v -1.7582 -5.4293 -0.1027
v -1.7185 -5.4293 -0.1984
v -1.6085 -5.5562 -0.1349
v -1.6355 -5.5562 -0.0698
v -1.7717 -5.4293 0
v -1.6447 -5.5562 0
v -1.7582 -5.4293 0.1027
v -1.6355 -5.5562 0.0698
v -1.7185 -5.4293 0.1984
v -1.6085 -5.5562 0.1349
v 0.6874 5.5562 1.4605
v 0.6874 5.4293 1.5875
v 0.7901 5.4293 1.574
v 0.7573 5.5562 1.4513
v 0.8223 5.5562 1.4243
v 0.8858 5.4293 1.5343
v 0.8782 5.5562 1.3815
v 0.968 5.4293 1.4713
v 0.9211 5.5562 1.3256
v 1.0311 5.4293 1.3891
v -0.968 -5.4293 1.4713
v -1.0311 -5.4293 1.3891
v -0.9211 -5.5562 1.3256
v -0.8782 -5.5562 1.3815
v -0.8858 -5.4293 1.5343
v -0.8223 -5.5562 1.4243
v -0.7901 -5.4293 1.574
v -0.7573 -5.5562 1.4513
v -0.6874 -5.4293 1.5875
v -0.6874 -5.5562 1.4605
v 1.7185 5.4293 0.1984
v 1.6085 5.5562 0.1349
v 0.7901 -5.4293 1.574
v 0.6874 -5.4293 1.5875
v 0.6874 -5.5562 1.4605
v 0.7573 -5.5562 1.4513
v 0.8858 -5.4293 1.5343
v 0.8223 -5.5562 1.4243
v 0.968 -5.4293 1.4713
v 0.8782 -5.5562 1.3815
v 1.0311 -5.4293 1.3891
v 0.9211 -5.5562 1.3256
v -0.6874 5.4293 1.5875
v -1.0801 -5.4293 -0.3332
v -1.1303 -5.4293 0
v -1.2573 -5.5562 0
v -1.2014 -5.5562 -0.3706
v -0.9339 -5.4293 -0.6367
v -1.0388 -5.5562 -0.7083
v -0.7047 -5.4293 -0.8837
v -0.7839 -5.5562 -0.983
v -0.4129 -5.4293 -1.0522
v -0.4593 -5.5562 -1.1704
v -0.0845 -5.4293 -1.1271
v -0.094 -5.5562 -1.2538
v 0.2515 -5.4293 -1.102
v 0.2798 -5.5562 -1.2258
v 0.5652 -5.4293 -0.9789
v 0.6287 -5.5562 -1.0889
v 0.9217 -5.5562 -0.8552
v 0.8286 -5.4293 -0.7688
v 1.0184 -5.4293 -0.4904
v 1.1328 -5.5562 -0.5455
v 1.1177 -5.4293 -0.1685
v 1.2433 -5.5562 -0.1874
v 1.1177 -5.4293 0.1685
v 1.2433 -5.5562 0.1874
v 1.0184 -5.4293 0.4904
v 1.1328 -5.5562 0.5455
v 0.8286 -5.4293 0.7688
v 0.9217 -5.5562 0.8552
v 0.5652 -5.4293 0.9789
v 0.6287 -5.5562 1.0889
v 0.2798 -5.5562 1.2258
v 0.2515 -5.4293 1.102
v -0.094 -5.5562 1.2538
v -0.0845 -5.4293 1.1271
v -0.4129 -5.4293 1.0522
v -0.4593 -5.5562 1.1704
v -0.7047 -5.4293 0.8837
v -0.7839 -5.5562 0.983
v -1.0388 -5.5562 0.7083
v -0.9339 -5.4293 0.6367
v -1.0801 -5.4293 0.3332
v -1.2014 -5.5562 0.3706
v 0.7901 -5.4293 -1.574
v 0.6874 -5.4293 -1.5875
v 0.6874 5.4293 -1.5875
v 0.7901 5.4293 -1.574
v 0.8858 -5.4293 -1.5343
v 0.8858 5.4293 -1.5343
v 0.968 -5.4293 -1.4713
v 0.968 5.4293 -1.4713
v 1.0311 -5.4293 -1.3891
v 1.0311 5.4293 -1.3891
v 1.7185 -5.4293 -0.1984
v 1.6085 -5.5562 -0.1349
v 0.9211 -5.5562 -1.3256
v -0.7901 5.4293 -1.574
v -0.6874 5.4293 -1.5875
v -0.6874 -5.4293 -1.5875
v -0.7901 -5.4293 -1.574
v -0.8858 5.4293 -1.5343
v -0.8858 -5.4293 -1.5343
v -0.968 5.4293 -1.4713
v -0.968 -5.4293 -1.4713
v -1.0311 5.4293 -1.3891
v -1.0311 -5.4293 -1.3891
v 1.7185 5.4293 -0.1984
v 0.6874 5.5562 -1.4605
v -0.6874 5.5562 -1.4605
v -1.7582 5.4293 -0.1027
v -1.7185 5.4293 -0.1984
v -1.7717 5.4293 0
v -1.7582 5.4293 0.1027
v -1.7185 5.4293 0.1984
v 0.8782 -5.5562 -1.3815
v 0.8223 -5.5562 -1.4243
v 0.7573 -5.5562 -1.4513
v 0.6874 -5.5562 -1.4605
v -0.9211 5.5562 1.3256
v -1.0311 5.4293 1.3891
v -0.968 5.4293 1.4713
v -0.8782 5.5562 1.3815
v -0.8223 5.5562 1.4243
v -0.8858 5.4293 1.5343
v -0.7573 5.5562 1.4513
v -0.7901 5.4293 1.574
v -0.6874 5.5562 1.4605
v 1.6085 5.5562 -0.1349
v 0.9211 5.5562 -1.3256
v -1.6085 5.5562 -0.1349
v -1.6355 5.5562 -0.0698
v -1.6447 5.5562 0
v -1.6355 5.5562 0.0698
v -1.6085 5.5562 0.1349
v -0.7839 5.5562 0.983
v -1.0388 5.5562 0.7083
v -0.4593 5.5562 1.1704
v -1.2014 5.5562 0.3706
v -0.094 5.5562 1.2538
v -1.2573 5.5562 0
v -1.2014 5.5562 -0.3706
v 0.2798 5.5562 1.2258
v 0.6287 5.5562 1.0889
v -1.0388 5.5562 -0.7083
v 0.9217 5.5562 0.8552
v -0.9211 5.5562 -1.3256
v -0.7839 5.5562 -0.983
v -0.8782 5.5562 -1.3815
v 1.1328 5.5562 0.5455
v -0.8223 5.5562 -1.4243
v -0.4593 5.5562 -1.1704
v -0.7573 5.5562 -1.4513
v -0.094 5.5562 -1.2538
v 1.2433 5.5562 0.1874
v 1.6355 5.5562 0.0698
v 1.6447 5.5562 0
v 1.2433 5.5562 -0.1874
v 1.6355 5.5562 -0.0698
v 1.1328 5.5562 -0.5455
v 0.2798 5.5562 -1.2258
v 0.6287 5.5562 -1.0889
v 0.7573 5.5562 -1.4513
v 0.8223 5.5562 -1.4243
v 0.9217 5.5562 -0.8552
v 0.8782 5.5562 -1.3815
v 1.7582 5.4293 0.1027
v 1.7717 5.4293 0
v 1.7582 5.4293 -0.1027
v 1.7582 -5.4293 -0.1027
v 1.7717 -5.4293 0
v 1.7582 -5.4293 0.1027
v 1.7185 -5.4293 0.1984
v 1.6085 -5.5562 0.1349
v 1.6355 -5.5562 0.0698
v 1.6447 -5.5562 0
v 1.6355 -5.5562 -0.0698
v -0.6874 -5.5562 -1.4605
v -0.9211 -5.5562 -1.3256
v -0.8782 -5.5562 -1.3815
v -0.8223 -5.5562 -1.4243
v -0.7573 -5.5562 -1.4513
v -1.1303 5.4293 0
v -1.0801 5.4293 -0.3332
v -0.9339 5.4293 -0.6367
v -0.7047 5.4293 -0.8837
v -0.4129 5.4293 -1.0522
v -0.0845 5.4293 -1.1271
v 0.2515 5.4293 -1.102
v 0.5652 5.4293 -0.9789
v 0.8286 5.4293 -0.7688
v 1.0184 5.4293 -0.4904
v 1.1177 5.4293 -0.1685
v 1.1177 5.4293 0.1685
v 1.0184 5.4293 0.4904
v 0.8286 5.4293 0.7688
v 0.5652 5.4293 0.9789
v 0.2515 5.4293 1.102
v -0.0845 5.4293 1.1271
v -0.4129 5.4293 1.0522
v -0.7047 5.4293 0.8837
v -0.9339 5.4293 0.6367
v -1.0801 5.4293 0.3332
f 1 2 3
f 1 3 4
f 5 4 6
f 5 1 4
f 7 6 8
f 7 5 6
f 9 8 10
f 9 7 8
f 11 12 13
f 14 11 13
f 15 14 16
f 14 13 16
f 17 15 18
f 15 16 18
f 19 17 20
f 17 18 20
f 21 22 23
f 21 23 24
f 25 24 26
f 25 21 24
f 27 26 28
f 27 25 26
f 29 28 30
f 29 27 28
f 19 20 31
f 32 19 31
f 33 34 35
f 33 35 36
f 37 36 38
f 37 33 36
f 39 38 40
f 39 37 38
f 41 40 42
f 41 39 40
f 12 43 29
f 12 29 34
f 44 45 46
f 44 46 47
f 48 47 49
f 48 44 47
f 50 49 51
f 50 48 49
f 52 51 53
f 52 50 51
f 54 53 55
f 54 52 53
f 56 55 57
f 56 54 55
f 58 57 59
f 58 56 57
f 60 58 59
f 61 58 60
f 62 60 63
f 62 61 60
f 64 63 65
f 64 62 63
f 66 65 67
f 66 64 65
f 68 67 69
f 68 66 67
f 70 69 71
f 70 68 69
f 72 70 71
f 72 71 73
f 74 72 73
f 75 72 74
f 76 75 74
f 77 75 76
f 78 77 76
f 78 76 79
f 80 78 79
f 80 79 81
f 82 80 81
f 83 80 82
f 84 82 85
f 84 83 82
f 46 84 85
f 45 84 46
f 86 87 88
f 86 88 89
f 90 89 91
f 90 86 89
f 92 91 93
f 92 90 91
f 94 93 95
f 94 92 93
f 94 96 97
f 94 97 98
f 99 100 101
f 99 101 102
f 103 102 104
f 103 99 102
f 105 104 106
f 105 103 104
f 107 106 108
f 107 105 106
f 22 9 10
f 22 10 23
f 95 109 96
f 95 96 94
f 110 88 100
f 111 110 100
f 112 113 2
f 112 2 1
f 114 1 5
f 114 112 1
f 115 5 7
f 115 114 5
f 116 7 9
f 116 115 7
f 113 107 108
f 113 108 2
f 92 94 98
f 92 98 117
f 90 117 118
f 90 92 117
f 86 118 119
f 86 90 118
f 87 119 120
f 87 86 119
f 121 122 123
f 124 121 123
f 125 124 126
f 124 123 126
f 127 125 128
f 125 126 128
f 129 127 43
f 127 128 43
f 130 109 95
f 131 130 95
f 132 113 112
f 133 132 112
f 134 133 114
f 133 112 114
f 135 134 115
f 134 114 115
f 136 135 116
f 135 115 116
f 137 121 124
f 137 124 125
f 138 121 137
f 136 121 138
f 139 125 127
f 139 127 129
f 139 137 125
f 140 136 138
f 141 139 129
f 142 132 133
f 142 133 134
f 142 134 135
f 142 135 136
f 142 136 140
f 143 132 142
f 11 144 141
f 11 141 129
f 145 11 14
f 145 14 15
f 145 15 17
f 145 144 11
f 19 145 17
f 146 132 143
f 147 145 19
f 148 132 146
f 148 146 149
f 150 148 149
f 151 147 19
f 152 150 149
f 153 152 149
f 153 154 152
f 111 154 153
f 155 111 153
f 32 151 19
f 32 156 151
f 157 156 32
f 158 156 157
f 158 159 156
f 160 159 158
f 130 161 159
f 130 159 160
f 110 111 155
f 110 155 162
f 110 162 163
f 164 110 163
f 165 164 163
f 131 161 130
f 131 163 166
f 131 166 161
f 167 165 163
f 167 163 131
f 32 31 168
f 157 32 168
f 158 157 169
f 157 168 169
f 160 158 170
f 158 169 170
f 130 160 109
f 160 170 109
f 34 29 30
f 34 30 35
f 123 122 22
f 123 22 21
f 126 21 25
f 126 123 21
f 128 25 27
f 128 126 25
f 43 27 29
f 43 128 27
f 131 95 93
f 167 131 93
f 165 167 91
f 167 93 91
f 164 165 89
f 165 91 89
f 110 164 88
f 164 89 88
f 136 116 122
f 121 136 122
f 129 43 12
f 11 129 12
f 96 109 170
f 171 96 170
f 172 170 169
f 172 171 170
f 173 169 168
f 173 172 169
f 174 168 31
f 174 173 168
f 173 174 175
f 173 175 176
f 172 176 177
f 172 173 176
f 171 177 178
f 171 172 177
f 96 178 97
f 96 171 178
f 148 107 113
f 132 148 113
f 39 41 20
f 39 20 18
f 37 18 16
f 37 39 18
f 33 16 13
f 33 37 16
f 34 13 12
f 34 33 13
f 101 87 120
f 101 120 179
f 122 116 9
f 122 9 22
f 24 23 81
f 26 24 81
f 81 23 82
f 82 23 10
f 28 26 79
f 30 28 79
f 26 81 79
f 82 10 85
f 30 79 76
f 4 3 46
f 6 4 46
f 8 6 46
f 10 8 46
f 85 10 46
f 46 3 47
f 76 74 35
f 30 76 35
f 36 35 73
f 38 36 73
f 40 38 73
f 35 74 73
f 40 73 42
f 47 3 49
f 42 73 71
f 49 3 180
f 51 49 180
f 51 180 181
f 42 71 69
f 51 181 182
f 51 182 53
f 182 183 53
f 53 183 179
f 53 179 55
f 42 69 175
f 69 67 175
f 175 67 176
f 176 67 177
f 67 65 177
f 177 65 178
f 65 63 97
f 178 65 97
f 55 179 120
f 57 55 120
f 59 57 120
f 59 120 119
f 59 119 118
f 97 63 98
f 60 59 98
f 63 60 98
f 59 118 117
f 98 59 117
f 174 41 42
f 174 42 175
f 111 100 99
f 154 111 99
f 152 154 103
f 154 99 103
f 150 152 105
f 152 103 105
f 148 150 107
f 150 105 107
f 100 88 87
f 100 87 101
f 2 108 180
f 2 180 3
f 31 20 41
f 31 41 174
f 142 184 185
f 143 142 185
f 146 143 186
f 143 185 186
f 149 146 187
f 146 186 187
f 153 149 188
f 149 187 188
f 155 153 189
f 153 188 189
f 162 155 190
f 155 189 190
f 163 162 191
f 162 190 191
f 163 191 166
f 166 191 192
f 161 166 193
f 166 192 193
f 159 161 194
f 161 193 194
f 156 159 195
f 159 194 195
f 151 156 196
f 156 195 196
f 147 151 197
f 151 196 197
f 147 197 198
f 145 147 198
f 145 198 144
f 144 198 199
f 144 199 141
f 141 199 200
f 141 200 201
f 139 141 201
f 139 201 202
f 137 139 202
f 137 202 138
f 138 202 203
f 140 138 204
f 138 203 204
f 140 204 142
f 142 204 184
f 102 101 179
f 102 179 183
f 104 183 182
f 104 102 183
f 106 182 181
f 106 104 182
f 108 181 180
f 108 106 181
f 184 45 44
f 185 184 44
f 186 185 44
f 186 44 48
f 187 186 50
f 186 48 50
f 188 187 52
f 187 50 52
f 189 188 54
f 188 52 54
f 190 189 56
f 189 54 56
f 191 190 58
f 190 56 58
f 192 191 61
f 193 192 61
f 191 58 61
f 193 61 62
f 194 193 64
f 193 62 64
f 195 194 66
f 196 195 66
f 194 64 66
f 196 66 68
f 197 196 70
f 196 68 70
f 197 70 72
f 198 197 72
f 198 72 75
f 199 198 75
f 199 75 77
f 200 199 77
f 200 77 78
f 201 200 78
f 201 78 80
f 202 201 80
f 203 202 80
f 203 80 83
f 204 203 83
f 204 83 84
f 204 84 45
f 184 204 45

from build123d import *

# Parameters (mm, degrees)
BOSS_EXTRUDE1_DEPTH   = 5.55625
F_4_40_TAPPED_HOLE1_D = 2.2606
FILLET1_R             = 0.396875
CHAMFER1_SIZE         = 0.127


with BuildPart() as part:
    # Sketch1 → Boss-Extrude1 (new body, symmetric)
    with BuildSketch(Plane(origin=(0, 0, 0), x_dir=(1, 0, 0), z_dir=(0, 1, 0))):
        Polygon((0.916543552, 1.5875), (-0.916543552, 1.5875), (-1.833087105, 0), (-0.916543552, -1.5875), (0.916543552, -1.5875), (1.833087105, 0), align=None)
    extrude(amount=BOSS_EXTRUDE1_DEPTH, both=True)

    # #4-40 Tapped Hole1 (through all)
    with Locations(Plane(origin=(0, 5.55625, 0), x_dir=(1, 0, 0), z_dir=(0, 1, 0))):
        with Locations((0, 0)):
            Hole(F_4_40_TAPPED_HOLE1_D / 2)

    # Fillet1
    fillet1_edges = [part.edges().sort_by_distance(p)[0] for p in [
        (1.833087105, 0, 0),
        (0.916543552, 0, 1.5875),
        (-0.916543552, 0, 1.5875),
        (-1.833087105, 0, 0),
        (-0.916543552, 0, -1.5875),
        (0.916543552, 0, -1.5875),
    ]]
    fillet(fillet1_edges, radius=FILLET1_R)

    # Chamfer1
    chamfer1_edges = [part.edges().sort_by_distance(p)[0] for p in [
        (1.1303, 5.55625, 0),
        (1.1303, -5.55625, 0),
        (-1.374815329, -5.55625, -0.79375),
        (-1.374815329, 5.55625, -0.79375),
        (1.374815329, -5.55625, -0.79375),
        (1.374815329, -5.55625, 0.79375),
        (0, -5.55625, 1.5875),
        (-1.374815329, -5.55625, 0.79375),
        (0, -5.55625, -1.5875),
        (-1.771690329, -5.55625, 0),
        (-0.885845164, -5.55625, 1.534328832),
        (0.885845164, -5.55625, 1.534328832),
        (1.771690329, -5.55625, 0),
        (0.885845164, -5.55625, -1.534328832),
        (-0.885845164, -5.55625, -1.534328832),
        (0, 5.55625, -1.5875),
        (1.374815329, 5.55625, -0.79375),
        (-1.374815329, 5.55625, 0.79375),
        (0, 5.55625, 1.5875),
        (1.374815329, 5.55625, 0.79375),
        (-1.771690329, 5.55625, 0),
        (-0.885845164, 5.55625, 1.534328832),
        (0.885845164, 5.55625, 1.534328832),
        (1.771690329, 5.55625, 0),
        (0.885845164, 5.55625, -1.534328832),
        (-0.885845164, 5.55625, -1.534328832),
    ]]
    chamfer(chamfer1_edges, length=CHAMFER1_SIZE)


solid = part.part
